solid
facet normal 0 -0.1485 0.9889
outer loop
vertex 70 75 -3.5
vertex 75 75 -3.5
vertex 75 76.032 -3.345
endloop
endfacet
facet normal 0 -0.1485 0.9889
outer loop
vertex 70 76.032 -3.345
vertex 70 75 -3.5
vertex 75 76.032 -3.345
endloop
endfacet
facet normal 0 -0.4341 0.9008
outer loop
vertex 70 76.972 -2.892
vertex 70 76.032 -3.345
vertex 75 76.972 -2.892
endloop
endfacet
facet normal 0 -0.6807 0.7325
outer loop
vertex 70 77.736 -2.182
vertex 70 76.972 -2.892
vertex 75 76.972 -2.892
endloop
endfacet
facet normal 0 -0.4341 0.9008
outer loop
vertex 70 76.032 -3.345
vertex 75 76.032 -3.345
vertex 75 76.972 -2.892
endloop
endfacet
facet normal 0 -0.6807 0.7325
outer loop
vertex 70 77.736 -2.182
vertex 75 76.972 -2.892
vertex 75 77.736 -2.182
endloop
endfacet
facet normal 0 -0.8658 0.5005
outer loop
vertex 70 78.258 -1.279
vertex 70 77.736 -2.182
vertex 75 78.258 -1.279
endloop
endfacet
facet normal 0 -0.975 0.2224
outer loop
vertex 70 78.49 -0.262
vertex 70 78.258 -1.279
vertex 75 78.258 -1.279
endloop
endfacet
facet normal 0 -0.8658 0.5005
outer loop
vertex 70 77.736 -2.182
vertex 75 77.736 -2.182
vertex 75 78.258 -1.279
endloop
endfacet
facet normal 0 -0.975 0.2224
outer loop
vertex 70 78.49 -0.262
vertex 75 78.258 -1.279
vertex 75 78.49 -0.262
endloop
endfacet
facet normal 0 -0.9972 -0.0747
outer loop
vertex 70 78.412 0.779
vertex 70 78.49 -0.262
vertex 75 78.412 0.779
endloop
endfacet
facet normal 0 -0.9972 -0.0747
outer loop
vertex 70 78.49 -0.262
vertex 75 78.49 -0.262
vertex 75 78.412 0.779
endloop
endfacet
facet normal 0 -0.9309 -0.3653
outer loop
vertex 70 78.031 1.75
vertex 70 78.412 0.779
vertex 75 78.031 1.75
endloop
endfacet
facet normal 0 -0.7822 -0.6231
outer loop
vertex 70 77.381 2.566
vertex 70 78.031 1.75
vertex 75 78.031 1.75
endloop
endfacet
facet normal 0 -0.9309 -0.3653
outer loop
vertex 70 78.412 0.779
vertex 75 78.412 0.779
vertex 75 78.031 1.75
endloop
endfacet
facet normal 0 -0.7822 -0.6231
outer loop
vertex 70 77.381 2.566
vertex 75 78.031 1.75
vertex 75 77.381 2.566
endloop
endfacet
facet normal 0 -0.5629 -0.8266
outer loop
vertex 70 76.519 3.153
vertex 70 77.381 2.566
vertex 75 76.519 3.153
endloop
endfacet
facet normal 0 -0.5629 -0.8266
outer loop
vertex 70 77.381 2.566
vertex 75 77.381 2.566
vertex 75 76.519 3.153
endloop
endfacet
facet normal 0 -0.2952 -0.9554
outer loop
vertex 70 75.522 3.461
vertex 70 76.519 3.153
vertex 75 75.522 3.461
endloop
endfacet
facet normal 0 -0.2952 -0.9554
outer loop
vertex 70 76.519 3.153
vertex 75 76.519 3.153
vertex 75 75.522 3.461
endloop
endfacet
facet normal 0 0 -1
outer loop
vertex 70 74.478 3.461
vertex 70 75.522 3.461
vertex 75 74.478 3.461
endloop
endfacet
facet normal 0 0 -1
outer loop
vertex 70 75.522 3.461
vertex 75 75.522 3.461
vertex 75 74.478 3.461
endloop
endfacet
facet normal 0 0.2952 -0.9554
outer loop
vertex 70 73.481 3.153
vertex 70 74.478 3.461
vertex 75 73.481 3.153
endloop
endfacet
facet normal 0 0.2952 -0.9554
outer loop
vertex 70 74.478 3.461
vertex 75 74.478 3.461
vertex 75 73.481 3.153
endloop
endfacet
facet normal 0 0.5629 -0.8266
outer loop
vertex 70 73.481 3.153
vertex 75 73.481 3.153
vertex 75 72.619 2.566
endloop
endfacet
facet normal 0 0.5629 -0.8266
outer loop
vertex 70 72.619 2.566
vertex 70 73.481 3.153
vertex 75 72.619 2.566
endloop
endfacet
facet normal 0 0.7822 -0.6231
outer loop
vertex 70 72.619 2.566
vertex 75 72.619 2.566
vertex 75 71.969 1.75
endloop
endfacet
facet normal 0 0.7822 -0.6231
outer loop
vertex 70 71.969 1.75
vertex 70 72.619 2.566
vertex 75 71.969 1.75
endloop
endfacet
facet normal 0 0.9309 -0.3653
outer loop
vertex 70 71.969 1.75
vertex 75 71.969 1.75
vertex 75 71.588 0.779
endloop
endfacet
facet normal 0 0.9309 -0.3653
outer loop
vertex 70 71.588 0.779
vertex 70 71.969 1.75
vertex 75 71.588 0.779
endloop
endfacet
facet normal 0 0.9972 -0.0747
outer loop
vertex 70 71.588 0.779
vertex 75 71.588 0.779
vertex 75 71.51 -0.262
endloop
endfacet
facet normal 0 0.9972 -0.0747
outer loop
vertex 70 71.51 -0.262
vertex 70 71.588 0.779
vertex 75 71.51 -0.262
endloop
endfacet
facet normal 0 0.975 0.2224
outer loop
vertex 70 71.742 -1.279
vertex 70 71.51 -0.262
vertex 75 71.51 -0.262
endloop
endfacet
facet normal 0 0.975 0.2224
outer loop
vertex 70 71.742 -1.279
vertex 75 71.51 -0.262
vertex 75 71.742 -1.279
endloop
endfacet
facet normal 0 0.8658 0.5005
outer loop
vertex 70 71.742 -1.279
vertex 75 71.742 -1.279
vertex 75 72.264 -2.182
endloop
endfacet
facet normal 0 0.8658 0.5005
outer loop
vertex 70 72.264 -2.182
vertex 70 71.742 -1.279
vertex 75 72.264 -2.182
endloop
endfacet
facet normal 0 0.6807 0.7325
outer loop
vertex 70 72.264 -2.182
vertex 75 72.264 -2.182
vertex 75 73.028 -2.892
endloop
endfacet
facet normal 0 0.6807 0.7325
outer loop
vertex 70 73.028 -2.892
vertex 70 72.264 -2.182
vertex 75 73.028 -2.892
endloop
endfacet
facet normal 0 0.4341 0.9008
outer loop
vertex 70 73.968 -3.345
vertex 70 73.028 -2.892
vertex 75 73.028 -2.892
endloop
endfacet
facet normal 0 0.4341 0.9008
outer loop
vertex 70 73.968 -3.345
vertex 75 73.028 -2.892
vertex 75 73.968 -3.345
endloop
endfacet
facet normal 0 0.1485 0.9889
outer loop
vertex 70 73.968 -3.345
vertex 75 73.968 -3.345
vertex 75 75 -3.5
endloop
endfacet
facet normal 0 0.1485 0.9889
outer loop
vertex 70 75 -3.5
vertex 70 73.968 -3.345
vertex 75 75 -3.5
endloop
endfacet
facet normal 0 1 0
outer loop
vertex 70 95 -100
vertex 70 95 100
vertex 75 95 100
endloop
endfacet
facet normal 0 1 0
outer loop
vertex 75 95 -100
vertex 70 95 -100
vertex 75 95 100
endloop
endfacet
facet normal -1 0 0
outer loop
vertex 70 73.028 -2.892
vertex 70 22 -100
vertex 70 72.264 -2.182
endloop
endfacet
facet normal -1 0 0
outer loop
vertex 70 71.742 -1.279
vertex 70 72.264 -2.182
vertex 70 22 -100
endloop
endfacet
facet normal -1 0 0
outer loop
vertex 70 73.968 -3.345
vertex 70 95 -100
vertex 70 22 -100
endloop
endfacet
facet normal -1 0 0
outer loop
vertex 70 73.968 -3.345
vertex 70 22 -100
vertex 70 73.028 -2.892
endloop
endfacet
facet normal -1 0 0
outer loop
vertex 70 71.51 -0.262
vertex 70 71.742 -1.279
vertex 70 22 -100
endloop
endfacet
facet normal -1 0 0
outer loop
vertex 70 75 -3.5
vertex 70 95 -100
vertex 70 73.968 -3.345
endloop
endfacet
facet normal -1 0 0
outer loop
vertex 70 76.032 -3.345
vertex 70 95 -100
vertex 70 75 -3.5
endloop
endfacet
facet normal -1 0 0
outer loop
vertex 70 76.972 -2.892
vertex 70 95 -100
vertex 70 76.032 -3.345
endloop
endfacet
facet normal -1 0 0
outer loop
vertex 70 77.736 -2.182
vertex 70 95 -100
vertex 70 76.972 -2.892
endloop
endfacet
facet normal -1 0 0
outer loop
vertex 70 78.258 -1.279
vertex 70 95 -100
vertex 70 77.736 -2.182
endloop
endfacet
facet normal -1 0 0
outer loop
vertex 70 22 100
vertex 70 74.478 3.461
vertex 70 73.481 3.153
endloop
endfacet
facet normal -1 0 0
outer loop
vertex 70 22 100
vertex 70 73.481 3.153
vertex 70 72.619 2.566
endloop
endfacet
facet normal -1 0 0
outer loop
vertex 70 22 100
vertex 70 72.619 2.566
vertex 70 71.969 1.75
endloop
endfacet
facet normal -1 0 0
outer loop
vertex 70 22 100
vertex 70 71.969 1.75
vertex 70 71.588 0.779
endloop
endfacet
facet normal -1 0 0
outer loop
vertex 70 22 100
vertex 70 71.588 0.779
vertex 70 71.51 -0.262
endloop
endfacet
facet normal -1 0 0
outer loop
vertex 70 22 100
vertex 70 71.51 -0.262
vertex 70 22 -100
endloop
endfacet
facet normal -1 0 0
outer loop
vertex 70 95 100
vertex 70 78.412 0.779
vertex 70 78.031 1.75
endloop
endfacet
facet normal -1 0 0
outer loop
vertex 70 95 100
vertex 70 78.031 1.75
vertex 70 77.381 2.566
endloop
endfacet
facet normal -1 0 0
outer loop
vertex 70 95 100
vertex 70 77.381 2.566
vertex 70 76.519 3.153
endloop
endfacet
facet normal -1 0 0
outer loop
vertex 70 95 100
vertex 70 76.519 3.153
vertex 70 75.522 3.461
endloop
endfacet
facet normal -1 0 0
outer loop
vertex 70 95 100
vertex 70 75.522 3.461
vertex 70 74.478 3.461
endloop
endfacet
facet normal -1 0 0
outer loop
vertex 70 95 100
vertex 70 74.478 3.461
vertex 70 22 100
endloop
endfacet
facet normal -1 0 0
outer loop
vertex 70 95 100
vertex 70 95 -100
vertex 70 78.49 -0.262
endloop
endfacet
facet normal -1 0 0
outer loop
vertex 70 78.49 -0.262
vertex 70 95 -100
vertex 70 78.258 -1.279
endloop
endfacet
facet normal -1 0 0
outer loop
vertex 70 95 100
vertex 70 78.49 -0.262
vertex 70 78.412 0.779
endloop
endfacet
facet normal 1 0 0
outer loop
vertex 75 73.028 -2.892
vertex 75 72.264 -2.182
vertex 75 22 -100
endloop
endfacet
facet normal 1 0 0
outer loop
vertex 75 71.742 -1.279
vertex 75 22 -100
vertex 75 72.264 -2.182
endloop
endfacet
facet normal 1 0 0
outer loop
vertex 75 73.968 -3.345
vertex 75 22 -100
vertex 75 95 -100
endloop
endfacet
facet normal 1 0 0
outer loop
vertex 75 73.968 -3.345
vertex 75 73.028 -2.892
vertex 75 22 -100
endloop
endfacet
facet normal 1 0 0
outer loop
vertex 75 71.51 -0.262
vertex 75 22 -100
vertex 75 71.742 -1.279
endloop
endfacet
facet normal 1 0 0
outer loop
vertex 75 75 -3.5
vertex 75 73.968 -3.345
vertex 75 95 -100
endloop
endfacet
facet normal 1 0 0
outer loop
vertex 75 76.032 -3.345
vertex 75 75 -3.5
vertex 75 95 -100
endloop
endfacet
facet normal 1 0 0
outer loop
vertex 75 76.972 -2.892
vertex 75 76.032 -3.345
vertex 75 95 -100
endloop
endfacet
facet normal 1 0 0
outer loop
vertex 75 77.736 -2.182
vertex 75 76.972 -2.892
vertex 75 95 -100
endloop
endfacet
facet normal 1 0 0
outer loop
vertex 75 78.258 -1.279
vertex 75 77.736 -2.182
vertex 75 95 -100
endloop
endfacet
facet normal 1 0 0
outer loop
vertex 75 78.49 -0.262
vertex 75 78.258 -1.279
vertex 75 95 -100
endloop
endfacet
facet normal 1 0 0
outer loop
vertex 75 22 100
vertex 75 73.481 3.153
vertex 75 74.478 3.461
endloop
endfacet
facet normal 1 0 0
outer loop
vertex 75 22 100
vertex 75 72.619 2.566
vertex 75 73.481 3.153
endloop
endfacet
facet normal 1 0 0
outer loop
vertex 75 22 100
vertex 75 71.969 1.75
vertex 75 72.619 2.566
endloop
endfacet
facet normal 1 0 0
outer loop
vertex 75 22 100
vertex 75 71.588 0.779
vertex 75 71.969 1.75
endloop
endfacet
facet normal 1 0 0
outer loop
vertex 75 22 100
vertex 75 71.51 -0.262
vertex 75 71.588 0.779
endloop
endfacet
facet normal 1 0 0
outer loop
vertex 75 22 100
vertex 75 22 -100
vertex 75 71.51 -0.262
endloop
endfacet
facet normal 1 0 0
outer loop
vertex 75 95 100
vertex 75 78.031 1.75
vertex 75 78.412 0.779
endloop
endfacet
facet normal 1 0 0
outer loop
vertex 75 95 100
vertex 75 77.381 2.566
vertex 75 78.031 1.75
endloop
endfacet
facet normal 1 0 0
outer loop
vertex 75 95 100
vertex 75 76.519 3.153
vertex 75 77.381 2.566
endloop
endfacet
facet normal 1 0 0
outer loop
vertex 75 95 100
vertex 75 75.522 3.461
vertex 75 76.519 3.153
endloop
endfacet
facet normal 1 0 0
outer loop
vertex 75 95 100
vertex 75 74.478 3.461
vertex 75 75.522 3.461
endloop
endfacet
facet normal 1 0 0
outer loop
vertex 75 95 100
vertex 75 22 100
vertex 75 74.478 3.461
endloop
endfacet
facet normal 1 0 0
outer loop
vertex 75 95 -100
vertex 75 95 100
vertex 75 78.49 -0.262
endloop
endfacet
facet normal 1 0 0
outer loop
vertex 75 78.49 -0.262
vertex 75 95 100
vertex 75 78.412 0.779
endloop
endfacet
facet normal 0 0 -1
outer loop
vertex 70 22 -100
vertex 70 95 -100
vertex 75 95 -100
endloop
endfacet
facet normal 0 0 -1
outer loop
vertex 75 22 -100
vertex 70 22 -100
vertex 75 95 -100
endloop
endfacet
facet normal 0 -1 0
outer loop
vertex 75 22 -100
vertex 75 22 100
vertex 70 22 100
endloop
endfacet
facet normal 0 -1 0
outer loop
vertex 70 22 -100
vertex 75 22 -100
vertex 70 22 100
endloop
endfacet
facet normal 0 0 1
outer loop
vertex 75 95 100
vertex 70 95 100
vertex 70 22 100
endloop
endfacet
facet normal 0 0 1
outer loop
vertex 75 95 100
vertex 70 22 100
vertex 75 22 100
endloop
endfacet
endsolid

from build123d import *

# Parameters (mm, degrees)
SKETCH1_W           = 150
SKETCH1_H           = 200
BOSS_EXTRUDE1_DEPTH = 100
SHELL2_T            = -5
SKETCH5_R           = 1.9
CUT_EXTRUDE2_DEPTH  = 10
BOSS_EXTRUDE4_DEPTH = 200
SKETCH9_W           = 101.133931545
SKETCH9_H           = 31.996148617
CUT_EXTRUDE4_DEPTH  = 236.849528301
SKETCH10_R          = 4
CUT_EXTRUDE5_DEPTH  = 10
CUT_EXTRUDE7_REACH  = 162.078
SKETCH11_W          = 140
SKETCH11_H          = 5
SKETCH15_R          = 1.2
CUT_EXTRUDE11_DEPTH = 10
SKETCH36_W          = 60
SKETCH36_H          = 5
BOSS_EXTRUDE7_DEPTH = 10
SKETCH37_R          = 3.5
CUT_EXTRUDE15_DEPTH = 60
SKETCH38_R          = 5
CUT_EXTRUDE16_DEPTH = 70
SKETCH42_W          = 159.84088679
SKETCH42_H          = 73
CUT_EXTRUDE20_DEPTH = 236.849528301


with BuildPart() as part:
    # Sketch1 → Boss-Extrude1 (new body)
    with BuildSketch(Plane(origin=(0, 0, 0), x_dir=(1, 0, 0), z_dir=(0, 1, 0))):
        Rectangle(SKETCH1_W, SKETCH1_H)
    extrude(amount=BOSS_EXTRUDE1_DEPTH)

    # Shell2
    shell2_openings = [part.faces().sort_by_distance(p)[0] for p in [
        (0, 50, -100),
        (0, 50, 100),
    ]]
    offset(amount=SHELL2_T, openings=shell2_openings, kind=Kind.INTERSECTION)

    # Sketch5 → Cut-Extrude2 (cut)
    with BuildSketch(Plane.XZ):
        with Locations(Location((-65, 91, 0), (0, 0, 270))):
            Circle(SKETCH5_R)
        with Locations(Location((-35, 91, 0), (0, 0, 270))):
            Circle(SKETCH5_R)
        with Locations(Location((-65, 67, 0), (0, 0, 270))):
            Circle(SKETCH5_R)
        with Locations(Location((-35, 67, 0), (0, 0, 270))):
            Circle(SKETCH5_R)
    cut_extrude2 = extrude(amount=-CUT_EXTRUDE2_DEPTH, mode=Mode.SUBTRACT)

    # Mirror2: Cut-Extrude2 across plane
    add(cut_extrude2.mirror(Plane.XY), mode=Mode.SUBTRACT)

    # Sketch8 → Boss-Extrude4 (add, through all)
    with BuildSketch(Plane.XY.offset(100)):
        Polygon((-15, 17), (75, 17), (75, 22), (-20, 22), (-20, 0), (-15, 0), align=None)
    extrude(amount=-BOSS_EXTRUDE4_DEPTH)

    # Sketch9 → Cut-Extrude4 (cut, through all)
    with BuildSketch(Plane.XY.offset(100)):
        with Locations((35.566965773, 1.001925691)):
            Rectangle(SKETCH9_W, SKETCH9_H)
    extrude(amount=-CUT_EXTRUDE4_DEPTH, mode=Mode.SUBTRACT)

    # Sketch10 → Cut-Extrude5 (cut)
    with BuildSketch(Plane.XZ.offset(-17)):
        with Locations((60, 0)):
            Circle(SKETCH10_R)
    extrude(amount=-CUT_EXTRUDE5_DEPTH, mode=Mode.SUBTRACT)

    # Cut-Extrude7: up to this face of the body (flat: up to its plane)
    cut_extrude7_end = Plane(part.part.faces().sort_by_distance((-44.954220044, 5, 0))[0])
    # Sketch11 → Cut-Extrude7 (cut, up to the picked face)
    with BuildSketch(Plane(origin=(0, 100, 0), x_dir=(1, 0, 0), z_dir=(0, 1, 0)), mode=Mode.PRIVATE) as cut_extrude7_sk1:
        with Locations((0, -92.5)):
            Rectangle(SKETCH11_W, SKETCH11_H)
    cut_extrude7_tool1 = split(extrude(cut_extrude7_sk1.sketch, amount=-CUT_EXTRUDE7_REACH, mode=Mode.PRIVATE), bisect_by=cut_extrude7_end, keep=Keep.BOTH, mode=Mode.PRIVATE)
    cut_extrude7 = cut_extrude7_tool1.solids().sort_by(Axis((0, 100, 92.5), (0, -1, 0)))[0]
    add(cut_extrude7, mode=Mode.SUBTRACT)

    # Mirror3: Cut-Extrude7 across plane
    add(cut_extrude7.mirror(Plane.XY), mode=Mode.SUBTRACT)

    # Sketch15 → Cut-Extrude11 (cut)
    with BuildSketch(Plane(origin=(0, 100, 0), x_dir=(1, 0, 0), z_dir=(0, 1, 0))):
        with Locations(Location((50, 28, 0), (0, 0, 270))):
            Circle(SKETCH15_R)
        with Locations(Location((50, -28, 0), (0, 0, 270))):
            Circle(SKETCH15_R)
        with Locations(Location((-20, 20, 0), (0, 0, 270))):
            Circle(SKETCH15_R)
        with Locations(Location((-20, -20, 0), (0, 0, 270))):
            Circle(SKETCH15_R)
    extrude(amount=-CUT_EXTRUDE11_DEPTH, mode=Mode.SUBTRACT)

    # Sketch36 → Boss-Extrude7 (add)
    with BuildSketch(Plane.ZY.offset(-70)):
        with Locations((-13.202053215, 62.5)):
            Rectangle(SKETCH36_W, SKETCH36_H)
    boss_extrude7 = extrude(amount=BOSS_EXTRUDE7_DEPTH)

    # Mirror5: Boss-Extrude7 across plane
    add(boss_extrude7.mirror(Plane(origin=(0, 0, 0), x_dir=(0, 0, 1), z_dir=(1, 0, 0))))

    # Sketch37 → Cut-Extrude15 (cut)
    with BuildSketch(Plane(origin=(75, 0, 0), x_dir=(0, 0, -1), z_dir=(1, 0, 0))):
        with Locations((0, 75)):
            Circle(SKETCH37_R)
    extrude(amount=-CUT_EXTRUDE15_DEPTH, mode=Mode.SUBTRACT)

    # Sketch38 → Cut-Extrude16 (cut)
    with BuildSketch(Plane.ZY.offset(75)):
        with Locations((0, 80)):
            Circle(SKETCH38_R)
    extrude(amount=-CUT_EXTRUDE16_DEPTH, mode=Mode.SUBTRACT)

    # Sketch42 → Cut-Extrude20 (cut, through all)
    with BuildSketch(Plane.XY.offset(100)):
        with Locations((-9.920443395, 58.5)):
            Rectangle(SKETCH42_W, SKETCH42_H)
        Polygon((-89.84088679, 95), (70, 95), (99.534009441, 95), (99.534009441, 106.078306858), (-89.84088679, 106.078306858), align=None)
        Polygon((106.355095751, 22), (70, 22), (-89.84088679, 22), (-89.84088679, -3.777083183), (106.355095751, -3.777083183), align=None)
    extrude(amount=-CUT_EXTRUDE20_DEPTH, mode=Mode.SUBTRACT)


solid = part.part
